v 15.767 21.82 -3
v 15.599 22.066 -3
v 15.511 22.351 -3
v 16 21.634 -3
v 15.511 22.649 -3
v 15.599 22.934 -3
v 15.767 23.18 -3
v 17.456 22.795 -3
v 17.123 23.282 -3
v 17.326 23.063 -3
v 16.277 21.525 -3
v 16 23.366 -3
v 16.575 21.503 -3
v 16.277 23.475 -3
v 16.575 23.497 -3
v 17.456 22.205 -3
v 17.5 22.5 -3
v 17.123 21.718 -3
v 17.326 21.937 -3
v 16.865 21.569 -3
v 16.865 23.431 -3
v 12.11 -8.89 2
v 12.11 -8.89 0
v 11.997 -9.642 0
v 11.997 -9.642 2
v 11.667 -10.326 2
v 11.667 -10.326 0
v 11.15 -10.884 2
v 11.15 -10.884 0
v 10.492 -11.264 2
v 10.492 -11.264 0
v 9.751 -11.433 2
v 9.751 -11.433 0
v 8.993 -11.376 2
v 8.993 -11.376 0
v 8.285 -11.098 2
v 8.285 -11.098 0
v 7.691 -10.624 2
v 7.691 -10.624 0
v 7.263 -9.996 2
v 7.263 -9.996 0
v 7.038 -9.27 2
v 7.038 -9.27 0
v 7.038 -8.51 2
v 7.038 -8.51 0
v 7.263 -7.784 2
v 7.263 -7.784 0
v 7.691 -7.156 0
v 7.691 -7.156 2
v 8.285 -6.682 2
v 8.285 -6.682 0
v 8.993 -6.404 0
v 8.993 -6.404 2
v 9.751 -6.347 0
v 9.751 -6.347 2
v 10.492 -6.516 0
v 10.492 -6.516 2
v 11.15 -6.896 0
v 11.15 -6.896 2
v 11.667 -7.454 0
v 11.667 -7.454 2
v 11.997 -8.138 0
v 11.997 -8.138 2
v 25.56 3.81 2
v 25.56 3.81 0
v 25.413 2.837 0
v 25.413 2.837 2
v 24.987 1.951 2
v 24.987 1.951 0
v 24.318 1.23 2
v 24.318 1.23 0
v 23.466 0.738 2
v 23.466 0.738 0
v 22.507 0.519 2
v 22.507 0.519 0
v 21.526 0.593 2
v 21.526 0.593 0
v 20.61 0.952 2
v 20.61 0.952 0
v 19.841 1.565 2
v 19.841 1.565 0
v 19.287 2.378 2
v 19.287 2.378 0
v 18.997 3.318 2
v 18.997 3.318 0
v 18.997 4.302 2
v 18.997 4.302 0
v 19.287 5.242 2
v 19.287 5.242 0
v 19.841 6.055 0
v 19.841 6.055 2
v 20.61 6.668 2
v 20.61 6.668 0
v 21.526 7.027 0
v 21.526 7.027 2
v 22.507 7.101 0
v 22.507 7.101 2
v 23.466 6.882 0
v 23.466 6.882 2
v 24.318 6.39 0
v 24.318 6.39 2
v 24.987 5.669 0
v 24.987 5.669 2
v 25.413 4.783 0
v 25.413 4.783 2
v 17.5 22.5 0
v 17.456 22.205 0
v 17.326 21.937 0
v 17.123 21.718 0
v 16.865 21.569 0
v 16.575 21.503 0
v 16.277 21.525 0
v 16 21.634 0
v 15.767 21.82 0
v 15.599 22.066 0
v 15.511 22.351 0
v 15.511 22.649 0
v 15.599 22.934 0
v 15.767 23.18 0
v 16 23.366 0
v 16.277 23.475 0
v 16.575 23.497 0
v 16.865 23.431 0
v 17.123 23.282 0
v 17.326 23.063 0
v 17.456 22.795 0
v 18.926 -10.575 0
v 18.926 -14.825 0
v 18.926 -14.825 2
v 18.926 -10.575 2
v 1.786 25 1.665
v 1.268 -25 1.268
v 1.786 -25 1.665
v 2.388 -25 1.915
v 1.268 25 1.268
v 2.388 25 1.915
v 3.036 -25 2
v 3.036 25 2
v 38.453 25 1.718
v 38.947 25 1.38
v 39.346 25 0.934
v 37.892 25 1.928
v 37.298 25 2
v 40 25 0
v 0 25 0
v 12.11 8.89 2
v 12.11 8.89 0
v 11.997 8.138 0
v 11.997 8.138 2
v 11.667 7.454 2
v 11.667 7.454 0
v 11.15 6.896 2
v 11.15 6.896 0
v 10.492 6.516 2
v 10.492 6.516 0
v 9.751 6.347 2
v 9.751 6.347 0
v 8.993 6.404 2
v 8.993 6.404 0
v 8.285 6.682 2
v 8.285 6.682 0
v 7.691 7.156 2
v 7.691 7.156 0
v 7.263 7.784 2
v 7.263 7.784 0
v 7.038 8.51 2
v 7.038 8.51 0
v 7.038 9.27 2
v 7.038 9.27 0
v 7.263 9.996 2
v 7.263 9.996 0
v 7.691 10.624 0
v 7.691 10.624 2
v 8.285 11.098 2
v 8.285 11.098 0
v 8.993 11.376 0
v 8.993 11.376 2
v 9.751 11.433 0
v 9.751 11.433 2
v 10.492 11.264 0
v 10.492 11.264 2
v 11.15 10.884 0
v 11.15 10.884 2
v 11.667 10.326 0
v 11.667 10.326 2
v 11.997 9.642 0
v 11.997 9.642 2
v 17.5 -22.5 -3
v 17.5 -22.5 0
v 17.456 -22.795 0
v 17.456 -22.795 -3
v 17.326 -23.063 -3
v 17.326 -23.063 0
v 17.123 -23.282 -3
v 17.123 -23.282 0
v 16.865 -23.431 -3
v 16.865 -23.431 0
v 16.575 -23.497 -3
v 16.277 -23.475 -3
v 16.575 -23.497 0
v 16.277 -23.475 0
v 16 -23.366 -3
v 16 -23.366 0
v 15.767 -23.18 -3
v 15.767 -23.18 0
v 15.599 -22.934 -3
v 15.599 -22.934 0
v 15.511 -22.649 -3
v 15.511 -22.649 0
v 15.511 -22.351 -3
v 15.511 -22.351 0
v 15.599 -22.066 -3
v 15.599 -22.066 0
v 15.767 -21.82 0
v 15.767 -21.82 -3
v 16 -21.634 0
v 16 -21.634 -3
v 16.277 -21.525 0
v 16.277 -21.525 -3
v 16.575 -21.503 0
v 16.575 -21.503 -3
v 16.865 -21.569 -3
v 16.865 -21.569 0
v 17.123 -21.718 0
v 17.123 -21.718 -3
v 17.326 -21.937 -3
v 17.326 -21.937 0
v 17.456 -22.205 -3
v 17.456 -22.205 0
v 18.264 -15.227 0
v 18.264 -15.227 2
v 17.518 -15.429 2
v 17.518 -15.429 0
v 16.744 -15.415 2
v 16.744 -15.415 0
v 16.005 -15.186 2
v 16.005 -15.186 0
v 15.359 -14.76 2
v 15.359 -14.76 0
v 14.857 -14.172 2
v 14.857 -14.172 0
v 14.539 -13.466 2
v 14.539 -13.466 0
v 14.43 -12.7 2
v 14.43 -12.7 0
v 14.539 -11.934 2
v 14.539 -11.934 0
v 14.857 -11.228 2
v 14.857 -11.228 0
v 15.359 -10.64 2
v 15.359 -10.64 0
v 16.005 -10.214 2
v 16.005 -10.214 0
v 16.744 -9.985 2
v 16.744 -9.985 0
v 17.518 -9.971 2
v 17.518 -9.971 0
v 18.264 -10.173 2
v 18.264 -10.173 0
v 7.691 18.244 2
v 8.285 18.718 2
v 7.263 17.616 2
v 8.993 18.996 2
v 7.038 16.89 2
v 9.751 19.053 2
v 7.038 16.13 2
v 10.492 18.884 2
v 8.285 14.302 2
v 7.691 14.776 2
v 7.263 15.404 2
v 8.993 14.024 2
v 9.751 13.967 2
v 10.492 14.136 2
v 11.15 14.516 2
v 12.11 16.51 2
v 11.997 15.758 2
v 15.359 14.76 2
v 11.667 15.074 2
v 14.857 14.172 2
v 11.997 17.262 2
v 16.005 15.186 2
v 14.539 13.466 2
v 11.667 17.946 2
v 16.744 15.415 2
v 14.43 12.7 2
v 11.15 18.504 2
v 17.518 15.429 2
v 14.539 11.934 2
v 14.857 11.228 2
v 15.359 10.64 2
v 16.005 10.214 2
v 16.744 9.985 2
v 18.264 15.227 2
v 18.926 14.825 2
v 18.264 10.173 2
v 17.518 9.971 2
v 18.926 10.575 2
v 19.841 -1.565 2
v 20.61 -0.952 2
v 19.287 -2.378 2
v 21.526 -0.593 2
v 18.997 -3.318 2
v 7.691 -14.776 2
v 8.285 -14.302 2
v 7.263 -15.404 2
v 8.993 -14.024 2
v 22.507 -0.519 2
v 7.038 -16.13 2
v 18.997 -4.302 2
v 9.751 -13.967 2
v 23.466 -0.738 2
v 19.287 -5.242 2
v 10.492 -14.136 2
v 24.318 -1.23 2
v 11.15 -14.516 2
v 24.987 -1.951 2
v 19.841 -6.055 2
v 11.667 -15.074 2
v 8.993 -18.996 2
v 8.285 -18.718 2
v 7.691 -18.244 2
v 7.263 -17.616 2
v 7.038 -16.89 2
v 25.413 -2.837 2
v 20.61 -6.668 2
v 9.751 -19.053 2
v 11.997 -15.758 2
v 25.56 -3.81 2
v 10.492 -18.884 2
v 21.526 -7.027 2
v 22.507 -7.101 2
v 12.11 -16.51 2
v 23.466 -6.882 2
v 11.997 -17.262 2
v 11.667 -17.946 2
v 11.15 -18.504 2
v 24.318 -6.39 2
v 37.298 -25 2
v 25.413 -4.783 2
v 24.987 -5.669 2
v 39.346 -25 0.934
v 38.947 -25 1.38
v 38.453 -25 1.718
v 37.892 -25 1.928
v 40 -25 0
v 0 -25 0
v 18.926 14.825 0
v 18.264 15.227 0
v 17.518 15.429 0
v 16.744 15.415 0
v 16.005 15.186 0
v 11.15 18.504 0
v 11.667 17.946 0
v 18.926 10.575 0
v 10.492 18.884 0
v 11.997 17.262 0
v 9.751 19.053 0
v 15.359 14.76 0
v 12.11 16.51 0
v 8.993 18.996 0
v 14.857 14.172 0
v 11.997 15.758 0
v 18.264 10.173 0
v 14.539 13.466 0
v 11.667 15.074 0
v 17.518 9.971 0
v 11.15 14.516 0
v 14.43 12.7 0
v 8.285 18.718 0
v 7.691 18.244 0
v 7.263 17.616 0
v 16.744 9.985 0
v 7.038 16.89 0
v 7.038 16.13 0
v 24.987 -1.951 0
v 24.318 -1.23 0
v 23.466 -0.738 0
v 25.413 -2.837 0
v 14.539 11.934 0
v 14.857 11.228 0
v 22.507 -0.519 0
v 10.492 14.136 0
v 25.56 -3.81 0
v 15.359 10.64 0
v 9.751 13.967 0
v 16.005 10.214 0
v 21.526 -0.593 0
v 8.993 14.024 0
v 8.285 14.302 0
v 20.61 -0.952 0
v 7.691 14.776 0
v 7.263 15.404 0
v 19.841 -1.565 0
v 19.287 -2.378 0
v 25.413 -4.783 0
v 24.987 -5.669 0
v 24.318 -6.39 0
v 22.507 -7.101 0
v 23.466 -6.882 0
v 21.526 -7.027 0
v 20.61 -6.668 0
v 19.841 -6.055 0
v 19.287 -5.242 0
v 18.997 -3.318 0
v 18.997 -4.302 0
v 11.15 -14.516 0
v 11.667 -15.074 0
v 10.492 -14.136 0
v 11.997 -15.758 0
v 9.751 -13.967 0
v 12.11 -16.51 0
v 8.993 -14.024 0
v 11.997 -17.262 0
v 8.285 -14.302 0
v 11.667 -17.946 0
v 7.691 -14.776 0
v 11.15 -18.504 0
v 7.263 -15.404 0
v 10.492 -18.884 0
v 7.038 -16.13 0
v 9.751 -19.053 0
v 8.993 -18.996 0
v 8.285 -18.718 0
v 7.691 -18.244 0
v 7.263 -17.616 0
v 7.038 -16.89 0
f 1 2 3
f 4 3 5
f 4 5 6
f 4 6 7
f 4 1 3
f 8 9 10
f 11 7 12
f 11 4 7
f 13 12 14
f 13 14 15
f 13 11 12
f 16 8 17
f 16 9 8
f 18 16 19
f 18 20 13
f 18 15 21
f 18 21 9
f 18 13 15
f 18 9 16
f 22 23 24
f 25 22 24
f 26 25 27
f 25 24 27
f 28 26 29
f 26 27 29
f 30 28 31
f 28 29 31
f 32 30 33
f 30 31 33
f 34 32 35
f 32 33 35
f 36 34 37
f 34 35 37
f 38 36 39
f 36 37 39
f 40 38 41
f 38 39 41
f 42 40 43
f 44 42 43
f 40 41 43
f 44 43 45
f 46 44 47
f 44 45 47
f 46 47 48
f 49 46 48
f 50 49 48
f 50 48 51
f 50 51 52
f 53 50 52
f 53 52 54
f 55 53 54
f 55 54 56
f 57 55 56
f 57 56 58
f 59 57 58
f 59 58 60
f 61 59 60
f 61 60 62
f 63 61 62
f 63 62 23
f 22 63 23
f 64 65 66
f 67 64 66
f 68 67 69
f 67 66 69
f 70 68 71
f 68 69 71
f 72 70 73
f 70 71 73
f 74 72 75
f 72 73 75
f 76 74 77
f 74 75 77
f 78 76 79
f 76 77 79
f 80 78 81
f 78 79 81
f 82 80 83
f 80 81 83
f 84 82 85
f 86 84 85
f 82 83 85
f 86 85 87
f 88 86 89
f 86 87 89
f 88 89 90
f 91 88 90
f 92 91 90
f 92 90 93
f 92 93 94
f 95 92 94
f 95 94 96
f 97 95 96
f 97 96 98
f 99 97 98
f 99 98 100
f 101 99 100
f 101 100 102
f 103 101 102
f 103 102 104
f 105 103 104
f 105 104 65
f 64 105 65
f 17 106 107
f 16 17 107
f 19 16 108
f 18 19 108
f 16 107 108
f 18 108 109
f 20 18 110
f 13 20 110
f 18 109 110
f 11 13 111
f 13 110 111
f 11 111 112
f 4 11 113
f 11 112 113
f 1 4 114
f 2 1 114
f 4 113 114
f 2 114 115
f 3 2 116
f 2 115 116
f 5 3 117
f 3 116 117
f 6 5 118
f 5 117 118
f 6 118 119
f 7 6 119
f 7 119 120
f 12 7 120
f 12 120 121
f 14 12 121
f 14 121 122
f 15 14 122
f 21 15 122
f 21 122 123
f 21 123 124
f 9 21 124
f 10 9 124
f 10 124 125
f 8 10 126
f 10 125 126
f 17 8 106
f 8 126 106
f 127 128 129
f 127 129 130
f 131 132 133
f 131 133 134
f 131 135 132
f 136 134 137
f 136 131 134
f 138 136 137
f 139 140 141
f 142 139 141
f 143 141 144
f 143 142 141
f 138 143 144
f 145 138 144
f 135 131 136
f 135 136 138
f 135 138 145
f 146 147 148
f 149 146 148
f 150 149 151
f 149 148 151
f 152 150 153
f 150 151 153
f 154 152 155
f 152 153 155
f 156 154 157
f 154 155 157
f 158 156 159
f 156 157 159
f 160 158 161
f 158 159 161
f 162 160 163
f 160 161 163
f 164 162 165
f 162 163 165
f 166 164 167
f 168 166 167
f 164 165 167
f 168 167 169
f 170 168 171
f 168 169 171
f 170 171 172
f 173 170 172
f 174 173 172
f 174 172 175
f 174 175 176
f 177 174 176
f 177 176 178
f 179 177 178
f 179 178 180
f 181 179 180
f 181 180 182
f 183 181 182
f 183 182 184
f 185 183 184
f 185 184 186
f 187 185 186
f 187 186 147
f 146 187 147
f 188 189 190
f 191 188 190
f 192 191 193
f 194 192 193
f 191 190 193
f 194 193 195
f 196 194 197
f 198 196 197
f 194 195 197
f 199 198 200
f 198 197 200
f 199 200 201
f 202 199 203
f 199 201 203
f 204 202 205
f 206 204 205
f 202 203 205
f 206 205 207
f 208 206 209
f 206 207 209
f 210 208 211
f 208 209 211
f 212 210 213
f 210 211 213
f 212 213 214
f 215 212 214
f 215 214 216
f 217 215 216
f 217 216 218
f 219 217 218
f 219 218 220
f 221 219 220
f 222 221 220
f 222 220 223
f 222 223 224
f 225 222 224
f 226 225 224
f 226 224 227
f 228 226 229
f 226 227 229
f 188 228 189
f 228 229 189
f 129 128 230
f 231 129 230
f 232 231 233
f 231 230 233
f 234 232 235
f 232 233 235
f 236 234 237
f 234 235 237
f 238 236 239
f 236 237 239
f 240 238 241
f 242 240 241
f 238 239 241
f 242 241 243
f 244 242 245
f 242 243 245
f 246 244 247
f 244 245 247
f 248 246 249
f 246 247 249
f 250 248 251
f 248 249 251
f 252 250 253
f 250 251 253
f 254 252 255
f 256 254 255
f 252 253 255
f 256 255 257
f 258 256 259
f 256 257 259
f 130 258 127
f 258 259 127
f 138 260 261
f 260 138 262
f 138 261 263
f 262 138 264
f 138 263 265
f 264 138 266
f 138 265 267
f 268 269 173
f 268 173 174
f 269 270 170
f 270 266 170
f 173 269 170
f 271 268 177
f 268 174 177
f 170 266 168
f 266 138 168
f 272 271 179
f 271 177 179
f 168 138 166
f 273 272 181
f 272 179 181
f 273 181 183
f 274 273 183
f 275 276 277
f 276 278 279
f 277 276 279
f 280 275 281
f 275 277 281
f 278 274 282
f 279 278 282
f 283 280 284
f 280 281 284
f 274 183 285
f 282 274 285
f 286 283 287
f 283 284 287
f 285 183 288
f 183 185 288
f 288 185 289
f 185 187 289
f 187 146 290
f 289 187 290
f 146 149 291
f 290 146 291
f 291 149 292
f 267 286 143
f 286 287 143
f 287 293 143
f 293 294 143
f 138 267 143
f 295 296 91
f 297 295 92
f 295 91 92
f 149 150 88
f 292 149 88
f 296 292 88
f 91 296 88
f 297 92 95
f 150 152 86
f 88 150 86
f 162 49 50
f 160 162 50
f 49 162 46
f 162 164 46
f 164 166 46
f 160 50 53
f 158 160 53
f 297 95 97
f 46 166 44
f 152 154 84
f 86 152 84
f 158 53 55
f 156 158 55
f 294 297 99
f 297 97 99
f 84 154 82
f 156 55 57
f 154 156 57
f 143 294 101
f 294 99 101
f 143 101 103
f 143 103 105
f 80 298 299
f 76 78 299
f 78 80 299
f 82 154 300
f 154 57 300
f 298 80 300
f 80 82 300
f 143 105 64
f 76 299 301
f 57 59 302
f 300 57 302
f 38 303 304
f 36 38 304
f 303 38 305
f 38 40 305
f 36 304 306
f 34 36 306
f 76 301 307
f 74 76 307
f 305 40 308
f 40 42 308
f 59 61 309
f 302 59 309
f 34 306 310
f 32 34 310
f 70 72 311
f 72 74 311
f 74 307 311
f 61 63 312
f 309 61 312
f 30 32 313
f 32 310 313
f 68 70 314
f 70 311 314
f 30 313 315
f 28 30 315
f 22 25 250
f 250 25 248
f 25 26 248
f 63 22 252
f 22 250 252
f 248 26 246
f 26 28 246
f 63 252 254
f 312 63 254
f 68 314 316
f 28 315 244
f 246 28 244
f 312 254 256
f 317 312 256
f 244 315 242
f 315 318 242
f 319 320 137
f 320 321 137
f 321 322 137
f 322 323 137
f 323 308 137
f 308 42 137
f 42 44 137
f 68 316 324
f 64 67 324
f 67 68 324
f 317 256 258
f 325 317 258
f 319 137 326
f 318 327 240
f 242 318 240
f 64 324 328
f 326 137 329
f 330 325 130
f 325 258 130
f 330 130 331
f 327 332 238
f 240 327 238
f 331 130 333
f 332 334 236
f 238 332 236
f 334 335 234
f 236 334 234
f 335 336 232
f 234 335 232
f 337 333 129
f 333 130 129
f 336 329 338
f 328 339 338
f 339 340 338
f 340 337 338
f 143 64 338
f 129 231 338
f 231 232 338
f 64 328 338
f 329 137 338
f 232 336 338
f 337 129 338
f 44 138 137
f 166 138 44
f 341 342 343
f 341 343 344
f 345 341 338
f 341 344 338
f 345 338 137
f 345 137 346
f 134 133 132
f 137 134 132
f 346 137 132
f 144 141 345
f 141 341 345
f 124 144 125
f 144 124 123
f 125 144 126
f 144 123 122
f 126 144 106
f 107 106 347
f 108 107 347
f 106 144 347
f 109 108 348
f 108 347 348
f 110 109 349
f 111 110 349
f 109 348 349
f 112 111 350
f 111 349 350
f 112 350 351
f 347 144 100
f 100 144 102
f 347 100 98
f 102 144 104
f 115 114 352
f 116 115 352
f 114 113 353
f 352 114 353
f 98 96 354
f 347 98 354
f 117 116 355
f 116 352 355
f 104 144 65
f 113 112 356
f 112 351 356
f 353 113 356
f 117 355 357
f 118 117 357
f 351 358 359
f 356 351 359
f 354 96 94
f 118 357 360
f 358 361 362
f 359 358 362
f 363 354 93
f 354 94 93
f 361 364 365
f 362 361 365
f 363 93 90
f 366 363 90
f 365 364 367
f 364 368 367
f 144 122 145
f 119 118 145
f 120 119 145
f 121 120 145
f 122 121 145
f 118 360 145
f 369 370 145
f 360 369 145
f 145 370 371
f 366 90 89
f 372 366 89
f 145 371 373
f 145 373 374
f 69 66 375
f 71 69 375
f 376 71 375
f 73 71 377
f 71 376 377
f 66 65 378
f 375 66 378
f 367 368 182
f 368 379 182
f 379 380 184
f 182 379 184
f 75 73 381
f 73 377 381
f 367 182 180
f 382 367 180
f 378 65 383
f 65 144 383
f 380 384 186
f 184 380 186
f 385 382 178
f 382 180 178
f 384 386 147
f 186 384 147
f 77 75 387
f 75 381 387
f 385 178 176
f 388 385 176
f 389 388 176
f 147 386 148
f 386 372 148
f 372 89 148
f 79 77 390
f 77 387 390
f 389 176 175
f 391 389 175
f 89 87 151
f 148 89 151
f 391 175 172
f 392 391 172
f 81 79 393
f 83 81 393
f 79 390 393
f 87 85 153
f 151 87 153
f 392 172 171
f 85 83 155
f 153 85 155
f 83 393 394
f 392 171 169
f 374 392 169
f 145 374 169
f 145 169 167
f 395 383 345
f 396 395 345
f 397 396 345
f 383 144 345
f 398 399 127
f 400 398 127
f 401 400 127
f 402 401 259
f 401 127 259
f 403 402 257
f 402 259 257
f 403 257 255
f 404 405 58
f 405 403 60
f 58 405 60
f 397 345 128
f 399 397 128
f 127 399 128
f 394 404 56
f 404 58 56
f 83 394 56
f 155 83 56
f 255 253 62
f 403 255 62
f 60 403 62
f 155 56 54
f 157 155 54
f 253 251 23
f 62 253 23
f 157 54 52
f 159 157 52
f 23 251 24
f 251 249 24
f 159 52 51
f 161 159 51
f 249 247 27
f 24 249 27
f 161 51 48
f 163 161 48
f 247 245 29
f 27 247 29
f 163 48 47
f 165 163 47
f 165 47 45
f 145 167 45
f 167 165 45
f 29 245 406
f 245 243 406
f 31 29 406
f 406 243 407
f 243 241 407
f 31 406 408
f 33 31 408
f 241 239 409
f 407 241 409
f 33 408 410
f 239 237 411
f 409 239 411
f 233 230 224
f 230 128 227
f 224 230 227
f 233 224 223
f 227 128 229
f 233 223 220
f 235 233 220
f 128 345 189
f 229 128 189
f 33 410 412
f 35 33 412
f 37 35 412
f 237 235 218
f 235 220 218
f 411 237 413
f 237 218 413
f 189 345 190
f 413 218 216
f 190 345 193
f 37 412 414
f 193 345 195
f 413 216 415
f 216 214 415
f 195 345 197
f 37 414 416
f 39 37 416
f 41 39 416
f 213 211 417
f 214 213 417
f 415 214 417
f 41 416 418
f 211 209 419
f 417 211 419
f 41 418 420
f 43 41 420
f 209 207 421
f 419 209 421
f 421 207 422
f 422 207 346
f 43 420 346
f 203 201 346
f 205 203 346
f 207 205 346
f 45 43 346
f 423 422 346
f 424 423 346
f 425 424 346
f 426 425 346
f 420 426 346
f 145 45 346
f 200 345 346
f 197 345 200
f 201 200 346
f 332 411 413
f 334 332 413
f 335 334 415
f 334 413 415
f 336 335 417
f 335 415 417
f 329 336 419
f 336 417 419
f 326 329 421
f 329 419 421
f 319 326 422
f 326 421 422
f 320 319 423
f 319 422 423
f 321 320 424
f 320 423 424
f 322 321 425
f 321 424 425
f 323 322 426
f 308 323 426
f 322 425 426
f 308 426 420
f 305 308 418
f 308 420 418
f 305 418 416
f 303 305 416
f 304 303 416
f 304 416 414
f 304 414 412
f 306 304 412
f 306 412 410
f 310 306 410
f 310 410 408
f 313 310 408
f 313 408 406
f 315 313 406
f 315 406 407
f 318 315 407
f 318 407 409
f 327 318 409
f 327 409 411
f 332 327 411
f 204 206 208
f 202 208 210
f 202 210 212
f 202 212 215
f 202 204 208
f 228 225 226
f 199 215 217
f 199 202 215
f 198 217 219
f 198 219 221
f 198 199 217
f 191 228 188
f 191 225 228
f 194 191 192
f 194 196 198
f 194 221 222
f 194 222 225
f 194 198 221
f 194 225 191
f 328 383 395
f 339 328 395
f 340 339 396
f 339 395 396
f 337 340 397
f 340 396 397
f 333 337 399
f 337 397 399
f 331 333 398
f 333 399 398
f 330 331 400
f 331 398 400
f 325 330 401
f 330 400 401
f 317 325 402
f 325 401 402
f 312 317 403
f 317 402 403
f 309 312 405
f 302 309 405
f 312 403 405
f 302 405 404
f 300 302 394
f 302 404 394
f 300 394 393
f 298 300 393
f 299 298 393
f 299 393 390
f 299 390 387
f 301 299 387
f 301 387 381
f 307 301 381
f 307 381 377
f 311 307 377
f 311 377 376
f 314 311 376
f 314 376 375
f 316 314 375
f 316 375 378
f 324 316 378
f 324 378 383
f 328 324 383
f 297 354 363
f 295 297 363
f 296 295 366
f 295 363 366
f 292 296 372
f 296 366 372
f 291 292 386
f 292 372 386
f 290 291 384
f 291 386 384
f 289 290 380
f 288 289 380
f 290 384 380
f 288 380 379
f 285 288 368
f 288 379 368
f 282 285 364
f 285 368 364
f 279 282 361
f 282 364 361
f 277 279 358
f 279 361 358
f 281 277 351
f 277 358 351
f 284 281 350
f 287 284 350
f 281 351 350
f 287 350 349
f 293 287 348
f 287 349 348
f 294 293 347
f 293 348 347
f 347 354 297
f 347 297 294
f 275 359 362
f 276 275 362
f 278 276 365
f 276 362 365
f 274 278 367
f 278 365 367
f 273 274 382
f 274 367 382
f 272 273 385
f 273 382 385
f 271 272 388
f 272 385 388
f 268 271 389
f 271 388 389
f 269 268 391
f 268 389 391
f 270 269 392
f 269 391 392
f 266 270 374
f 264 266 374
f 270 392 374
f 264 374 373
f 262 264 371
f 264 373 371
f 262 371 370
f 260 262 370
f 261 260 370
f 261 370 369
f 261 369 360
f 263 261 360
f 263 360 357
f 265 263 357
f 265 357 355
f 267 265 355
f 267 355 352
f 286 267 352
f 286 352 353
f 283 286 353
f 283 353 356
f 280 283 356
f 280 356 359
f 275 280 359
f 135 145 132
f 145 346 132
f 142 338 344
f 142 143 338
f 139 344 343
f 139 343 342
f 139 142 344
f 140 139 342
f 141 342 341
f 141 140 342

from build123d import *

# Parameters (mm, degrees)
PAD_DEPTH     = 25
SKETCH001_R   = 1
PAD001_DEPTH  = 3
SKETCH002_R   = 2.55
SKETCH002_R_2 = 3.3
POCKET_DEPTH  = 2.001
FILLET_R      = 2.5


with BuildPart() as part:
    # Sketch → Pad (new body, symmetric)
    with BuildSketch(Plane.XZ):
        Polygon((0, 0), (2, 2), (38.599585, 2), (40, 0), align=None)
    extrude(amount=PAD_DEPTH, both=True)

    # Sketch001 (on Face4 of Pad) → Pad001 (join)
    with BuildSketch(Plane(origin=(0, 0, 0), x_dir=(1, 0, 0), z_dir=(0, 0, -1))):
        with Locations((16.5, 22.5)):
            Circle(SKETCH001_R)
        with Locations((16.5, -22.5)):
            Circle(SKETCH001_R)
    extrude(amount=PAD001_DEPTH)

    # Sketch002 (on Face2 of Pad001) → Pocket (cut, through all)
    with BuildSketch(Plane(origin=(0, 0, 0), x_dir=(1, 0, 0), z_dir=(0, 0, -1))):
        with Locations((9.56, 16.51)):
            Circle(SKETCH002_R)
        with Locations((9.56, 8.89)):
            Circle(SKETCH002_R)
        with Locations((9.56, -8.89)):
            Circle(SKETCH002_R)
        with Locations((9.56, -16.51)):
            Circle(SKETCH002_R)
        with Locations((22.26, 3.81)):
            Circle(SKETCH002_R_2)
        with Locations((22.26, -3.81)):
            Circle(SKETCH002_R_2)
        with BuildLine():
            Line((18.92553, 14.825), (18.92553, 10.575))
            ThreePointArc((18.92553, 14.825), (14.43, 12.7), (18.92553, 10.575))
        make_face()
        with BuildLine():
            Line((18.92553, -10.575), (18.92553, -14.825))
            ThreePointArc((18.92553, -10.575), (14.43, -12.7), (18.92553, -14.825))
        make_face()
    extrude(amount=-POCKET_DEPTH, mode=Mode.SUBTRACT)

    # Fillet
    fillet_edges = [part.edges().sort_by_distance(p)[0] for p in [
        (38.599585, 0, 2),
        (2, 0, 2),
    ]]
    fillet(fillet_edges, radius=FILLET_R)


solid = part.part
